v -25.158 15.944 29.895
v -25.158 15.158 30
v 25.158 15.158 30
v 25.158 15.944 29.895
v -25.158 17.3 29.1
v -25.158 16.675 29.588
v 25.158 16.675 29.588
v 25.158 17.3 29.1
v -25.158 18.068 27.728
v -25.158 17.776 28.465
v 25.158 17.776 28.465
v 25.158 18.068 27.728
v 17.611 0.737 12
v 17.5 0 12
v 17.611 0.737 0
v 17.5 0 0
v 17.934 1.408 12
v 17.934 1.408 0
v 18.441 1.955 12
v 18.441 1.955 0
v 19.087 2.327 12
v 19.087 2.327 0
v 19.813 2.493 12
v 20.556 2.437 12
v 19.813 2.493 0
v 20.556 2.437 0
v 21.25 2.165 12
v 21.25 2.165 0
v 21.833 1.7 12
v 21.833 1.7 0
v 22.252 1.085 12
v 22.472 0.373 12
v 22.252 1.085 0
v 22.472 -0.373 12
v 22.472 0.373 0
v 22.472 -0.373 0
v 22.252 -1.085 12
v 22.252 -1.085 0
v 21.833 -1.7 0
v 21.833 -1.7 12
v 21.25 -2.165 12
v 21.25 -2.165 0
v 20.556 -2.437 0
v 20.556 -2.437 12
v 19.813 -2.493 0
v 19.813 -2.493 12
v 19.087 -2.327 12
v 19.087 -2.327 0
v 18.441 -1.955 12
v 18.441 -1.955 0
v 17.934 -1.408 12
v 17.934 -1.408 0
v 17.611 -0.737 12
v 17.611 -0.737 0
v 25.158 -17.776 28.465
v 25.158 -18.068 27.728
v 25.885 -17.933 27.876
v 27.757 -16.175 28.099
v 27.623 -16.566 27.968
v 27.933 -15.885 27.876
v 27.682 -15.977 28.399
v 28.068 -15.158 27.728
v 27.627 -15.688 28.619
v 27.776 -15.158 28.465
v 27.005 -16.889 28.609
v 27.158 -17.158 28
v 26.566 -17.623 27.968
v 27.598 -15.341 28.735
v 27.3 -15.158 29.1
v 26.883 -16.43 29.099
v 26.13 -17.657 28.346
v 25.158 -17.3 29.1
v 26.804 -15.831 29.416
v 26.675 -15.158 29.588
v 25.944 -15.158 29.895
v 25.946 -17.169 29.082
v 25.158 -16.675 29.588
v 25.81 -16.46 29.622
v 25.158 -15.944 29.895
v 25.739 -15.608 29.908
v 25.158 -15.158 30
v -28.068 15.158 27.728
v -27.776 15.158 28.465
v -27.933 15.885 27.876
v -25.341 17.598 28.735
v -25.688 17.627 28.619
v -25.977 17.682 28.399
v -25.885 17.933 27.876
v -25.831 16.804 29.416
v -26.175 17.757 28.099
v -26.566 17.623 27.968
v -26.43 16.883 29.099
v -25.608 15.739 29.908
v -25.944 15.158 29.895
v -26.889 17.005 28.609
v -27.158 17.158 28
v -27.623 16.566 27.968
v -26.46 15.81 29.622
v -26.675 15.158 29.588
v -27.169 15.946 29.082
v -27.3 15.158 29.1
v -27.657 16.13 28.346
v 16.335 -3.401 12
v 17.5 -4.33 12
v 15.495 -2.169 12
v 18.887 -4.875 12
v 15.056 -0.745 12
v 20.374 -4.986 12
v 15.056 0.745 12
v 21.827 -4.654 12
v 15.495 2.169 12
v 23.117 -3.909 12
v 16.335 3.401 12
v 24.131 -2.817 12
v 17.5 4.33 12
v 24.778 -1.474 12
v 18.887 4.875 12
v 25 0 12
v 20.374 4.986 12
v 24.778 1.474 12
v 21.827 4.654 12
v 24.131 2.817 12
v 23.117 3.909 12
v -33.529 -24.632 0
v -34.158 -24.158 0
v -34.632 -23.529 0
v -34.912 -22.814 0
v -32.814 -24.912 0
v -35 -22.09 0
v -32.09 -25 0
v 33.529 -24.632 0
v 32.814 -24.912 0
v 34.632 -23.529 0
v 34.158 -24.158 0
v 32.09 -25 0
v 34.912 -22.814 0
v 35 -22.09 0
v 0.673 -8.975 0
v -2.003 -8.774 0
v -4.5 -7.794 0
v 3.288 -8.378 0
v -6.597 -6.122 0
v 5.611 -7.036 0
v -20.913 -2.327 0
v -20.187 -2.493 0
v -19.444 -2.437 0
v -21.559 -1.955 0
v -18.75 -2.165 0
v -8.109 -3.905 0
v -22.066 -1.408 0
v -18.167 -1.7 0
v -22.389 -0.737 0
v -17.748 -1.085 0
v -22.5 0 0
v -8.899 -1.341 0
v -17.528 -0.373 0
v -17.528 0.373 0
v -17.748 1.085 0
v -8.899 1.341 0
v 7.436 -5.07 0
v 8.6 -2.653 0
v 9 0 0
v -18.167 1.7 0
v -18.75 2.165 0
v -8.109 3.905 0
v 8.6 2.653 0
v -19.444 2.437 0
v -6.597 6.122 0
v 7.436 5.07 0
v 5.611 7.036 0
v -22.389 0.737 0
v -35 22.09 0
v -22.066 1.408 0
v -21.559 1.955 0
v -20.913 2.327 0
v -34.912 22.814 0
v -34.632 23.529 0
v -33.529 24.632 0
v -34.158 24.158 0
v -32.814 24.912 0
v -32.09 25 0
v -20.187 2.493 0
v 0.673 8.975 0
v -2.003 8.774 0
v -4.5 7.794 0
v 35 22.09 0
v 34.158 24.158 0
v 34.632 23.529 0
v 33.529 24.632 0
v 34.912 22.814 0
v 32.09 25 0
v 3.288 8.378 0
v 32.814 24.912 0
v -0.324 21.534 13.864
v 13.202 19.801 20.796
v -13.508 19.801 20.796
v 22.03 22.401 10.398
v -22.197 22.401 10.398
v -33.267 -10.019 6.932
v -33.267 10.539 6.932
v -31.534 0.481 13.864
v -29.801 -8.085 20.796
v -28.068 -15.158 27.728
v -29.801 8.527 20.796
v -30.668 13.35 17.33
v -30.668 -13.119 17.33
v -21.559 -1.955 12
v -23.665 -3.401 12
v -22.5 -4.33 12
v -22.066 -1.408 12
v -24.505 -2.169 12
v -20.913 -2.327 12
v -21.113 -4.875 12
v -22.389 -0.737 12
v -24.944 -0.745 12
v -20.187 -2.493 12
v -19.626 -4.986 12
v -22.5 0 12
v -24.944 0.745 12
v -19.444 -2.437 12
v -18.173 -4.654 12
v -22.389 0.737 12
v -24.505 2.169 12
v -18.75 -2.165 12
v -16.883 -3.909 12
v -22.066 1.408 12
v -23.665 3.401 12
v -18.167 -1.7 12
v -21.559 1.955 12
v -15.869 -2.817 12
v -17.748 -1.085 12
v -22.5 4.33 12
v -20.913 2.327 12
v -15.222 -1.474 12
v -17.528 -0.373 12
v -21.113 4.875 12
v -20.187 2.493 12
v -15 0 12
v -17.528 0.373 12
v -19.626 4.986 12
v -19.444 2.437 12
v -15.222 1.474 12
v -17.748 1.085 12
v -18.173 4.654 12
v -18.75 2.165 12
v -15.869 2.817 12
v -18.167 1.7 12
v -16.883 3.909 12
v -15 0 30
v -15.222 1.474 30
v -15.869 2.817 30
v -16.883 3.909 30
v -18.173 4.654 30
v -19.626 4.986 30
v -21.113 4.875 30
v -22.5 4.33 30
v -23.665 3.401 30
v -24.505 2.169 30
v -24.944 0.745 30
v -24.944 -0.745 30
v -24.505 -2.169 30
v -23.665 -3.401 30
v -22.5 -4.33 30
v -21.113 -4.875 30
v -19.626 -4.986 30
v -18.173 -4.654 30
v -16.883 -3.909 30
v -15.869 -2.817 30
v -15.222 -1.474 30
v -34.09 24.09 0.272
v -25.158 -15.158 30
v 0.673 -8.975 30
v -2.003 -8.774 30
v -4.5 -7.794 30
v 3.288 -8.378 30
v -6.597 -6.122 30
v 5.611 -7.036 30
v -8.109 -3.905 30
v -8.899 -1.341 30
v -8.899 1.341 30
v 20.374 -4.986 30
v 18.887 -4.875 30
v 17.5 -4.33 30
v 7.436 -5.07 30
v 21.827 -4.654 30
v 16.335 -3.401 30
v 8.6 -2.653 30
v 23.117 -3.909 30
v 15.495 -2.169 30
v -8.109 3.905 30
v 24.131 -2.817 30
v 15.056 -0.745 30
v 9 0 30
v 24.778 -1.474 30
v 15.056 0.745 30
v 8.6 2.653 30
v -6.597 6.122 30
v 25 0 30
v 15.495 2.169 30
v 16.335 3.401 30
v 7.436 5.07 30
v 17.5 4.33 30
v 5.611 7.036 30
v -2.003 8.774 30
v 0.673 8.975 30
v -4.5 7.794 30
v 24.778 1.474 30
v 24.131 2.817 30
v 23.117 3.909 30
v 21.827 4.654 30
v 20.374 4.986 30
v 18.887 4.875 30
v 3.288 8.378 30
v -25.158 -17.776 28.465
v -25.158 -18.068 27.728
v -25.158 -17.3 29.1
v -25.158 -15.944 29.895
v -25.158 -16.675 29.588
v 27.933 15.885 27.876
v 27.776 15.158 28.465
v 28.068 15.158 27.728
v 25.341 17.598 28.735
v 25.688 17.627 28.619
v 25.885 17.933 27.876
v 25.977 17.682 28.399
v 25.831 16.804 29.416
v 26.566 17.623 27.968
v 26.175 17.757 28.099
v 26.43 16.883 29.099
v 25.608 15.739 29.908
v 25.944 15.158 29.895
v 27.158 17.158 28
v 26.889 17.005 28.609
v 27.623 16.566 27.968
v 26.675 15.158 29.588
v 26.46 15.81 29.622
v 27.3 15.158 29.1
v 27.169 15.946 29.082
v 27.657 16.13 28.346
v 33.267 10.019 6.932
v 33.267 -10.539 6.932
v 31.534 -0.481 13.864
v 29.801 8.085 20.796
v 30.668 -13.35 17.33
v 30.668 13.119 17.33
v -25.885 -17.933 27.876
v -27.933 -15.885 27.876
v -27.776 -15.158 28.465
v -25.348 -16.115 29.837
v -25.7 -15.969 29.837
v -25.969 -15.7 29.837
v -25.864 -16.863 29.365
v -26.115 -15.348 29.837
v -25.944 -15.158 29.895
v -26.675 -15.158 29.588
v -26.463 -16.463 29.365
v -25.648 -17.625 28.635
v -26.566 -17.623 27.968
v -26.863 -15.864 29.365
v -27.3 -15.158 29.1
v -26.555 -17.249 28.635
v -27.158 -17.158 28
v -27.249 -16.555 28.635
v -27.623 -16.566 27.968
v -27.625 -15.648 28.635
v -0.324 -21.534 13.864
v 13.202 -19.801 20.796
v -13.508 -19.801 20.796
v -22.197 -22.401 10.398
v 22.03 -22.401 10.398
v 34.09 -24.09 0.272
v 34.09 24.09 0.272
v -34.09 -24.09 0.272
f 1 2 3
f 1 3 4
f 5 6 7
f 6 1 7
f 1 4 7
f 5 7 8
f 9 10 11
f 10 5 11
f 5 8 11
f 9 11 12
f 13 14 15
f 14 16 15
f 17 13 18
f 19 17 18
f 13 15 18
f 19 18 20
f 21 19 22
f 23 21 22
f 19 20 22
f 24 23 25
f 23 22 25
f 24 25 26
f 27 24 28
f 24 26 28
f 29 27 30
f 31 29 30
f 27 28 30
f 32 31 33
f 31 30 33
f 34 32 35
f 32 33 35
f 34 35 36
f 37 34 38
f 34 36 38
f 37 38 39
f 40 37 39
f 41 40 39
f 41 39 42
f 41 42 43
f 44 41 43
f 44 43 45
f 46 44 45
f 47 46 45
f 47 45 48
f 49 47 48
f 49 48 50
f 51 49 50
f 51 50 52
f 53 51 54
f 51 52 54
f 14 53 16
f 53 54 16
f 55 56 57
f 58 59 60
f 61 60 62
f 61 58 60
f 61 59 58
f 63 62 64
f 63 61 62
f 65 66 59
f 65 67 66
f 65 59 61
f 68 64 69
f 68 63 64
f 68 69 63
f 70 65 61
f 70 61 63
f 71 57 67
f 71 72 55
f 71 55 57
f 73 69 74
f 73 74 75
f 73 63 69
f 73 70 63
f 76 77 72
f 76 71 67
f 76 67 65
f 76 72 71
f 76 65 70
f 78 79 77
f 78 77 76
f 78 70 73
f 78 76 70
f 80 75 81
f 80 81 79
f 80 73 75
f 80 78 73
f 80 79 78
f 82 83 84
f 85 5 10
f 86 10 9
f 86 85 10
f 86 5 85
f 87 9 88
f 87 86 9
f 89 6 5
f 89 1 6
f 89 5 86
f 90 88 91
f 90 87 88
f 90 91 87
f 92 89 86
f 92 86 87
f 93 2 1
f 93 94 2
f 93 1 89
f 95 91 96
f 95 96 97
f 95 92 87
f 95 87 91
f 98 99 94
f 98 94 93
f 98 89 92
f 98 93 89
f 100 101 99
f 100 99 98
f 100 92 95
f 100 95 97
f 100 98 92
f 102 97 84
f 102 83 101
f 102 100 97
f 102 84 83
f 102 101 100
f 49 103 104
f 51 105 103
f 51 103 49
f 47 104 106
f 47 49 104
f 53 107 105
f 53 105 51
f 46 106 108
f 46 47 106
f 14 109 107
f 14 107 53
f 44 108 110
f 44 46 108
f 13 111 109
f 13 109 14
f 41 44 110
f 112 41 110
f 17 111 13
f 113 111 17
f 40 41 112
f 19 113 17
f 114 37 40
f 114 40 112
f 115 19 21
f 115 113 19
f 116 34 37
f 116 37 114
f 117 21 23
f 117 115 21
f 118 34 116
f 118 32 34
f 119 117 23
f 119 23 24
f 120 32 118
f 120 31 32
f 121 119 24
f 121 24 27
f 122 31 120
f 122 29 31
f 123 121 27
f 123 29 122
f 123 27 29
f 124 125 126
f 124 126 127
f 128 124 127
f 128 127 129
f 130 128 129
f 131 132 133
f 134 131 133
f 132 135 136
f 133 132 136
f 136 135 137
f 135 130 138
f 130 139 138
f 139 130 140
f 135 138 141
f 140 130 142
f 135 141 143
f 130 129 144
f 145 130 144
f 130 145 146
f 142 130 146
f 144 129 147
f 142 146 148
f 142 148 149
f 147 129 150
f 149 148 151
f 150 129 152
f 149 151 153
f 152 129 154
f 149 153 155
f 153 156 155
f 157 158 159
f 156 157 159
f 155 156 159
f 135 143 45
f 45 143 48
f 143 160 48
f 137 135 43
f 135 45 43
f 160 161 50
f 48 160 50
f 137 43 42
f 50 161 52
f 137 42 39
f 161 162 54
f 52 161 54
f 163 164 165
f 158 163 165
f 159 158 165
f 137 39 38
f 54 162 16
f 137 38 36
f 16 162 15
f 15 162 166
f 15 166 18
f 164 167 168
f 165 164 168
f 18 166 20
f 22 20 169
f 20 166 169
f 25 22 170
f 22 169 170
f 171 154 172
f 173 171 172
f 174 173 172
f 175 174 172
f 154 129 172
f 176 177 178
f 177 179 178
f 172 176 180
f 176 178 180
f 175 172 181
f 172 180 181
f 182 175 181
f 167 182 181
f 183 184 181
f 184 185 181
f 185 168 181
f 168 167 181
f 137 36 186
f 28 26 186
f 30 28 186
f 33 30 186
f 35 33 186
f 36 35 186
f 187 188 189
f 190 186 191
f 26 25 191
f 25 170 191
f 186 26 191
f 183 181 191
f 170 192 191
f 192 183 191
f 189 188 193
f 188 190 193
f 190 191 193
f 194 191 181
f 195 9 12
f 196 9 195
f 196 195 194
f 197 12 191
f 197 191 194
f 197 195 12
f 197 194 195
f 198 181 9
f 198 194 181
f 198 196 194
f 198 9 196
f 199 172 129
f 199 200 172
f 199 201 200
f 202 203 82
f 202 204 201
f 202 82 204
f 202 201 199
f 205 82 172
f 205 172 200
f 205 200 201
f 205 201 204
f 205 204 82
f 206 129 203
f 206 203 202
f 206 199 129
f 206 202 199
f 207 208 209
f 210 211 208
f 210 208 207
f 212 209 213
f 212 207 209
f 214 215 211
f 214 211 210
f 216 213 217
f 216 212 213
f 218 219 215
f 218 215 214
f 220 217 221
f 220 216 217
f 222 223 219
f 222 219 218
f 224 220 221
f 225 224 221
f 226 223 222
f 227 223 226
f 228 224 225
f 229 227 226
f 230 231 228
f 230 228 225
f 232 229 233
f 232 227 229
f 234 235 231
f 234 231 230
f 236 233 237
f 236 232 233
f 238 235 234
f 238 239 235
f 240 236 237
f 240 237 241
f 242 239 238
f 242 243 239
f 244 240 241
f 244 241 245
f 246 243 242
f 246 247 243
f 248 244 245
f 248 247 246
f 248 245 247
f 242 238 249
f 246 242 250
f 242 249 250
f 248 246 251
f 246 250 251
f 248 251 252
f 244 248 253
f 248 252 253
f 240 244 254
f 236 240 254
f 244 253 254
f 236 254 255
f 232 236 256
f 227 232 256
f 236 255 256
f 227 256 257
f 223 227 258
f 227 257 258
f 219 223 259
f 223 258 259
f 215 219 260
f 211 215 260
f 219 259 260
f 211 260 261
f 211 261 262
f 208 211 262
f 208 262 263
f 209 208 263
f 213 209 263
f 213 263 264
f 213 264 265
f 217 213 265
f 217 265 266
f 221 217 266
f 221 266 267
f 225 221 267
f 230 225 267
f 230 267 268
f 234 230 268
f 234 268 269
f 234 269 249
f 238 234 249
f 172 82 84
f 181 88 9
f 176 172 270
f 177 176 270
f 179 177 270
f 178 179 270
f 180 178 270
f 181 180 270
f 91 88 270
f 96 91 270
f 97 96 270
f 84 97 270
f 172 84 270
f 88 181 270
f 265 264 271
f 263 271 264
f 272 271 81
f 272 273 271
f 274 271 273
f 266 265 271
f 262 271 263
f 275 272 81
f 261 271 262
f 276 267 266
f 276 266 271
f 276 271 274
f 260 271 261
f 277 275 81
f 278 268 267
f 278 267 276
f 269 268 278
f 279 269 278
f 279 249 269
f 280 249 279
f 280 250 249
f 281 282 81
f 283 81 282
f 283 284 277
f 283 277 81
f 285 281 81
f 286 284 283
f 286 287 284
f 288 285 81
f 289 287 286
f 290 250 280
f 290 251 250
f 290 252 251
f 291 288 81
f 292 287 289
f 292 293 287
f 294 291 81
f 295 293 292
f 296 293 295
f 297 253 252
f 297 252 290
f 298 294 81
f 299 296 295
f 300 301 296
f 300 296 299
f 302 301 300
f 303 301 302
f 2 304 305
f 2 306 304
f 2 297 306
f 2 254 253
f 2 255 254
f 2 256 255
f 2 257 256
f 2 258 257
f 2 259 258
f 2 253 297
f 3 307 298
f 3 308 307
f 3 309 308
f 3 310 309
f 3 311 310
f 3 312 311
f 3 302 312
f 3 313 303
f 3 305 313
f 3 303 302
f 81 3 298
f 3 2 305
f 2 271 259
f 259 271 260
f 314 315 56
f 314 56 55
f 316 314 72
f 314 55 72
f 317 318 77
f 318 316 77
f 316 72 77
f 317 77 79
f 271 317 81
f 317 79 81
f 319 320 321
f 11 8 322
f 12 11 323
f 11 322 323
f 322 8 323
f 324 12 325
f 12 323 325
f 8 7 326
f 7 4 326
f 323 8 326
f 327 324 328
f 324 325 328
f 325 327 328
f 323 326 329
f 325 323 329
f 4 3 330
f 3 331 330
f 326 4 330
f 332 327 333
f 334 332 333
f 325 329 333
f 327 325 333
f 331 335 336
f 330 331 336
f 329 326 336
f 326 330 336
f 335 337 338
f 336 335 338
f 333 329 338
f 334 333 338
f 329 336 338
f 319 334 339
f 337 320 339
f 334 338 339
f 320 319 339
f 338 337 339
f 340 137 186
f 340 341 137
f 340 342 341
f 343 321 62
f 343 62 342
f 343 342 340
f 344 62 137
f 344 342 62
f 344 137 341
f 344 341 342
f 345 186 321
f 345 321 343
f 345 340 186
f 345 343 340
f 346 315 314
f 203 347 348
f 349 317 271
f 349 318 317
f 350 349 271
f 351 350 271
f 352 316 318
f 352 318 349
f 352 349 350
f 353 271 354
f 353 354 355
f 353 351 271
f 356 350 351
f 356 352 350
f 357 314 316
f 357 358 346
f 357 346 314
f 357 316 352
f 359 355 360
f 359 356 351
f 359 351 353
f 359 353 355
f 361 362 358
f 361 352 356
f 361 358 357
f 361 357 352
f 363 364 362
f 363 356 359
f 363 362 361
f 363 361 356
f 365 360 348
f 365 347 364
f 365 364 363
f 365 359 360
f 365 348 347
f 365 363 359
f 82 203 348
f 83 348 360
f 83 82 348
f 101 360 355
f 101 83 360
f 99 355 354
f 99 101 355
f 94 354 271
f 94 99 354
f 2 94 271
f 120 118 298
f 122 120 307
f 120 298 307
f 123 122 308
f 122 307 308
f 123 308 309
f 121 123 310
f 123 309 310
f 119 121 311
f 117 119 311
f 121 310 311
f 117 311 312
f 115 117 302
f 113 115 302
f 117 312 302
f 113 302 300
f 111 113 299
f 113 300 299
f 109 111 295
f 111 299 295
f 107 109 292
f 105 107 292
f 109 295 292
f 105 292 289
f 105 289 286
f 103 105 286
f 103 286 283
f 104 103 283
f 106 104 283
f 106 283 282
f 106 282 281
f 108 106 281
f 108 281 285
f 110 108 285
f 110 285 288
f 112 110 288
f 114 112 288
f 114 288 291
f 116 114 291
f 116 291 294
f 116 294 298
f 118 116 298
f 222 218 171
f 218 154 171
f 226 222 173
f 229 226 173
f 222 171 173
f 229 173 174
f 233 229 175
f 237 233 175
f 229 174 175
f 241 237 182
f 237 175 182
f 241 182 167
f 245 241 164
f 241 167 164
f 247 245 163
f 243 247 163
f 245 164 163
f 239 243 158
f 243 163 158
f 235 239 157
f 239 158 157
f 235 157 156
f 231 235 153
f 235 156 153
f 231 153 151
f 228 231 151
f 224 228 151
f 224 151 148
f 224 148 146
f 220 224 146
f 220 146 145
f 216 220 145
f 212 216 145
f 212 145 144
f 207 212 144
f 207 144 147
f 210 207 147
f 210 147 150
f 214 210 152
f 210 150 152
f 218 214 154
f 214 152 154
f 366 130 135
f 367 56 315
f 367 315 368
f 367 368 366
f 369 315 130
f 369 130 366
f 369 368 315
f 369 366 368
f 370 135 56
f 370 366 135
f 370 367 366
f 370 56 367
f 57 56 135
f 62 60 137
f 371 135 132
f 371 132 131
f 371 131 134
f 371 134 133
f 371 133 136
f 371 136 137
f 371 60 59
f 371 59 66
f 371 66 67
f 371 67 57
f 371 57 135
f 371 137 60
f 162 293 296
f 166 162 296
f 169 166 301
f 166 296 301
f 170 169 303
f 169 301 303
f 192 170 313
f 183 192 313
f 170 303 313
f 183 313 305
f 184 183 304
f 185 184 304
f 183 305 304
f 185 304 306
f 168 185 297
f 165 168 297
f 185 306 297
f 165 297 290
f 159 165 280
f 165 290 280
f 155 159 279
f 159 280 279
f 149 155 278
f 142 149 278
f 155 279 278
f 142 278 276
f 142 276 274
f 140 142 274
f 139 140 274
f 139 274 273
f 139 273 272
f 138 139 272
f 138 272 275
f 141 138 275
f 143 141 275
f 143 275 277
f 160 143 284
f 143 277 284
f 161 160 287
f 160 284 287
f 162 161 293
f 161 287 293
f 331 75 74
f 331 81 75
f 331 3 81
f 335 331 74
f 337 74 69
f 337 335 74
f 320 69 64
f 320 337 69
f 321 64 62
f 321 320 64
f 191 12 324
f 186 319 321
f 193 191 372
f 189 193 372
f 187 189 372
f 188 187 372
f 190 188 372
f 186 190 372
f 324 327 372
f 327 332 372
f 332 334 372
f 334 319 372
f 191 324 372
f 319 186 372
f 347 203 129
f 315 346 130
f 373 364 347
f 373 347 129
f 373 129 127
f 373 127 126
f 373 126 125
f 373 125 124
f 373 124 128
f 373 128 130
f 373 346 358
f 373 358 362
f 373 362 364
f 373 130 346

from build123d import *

# Parameters (mm, degrees)
SKETCH_W         = 70
SKETCH_H         = 50
SKETCH001_W      = 55
SKETCH001_H      = 35
SKETCH002_R      = 9
POCKET_DEPTH     = 30
HOLE_D           = 5
HOLE_CBORE_D     = 10
HOLE_CBORE_DEPTH = 18
FILLET_R         = 3


with BuildPart() as part:
    # Sketch → AdditiveLoft section 0
    with BuildSketch(Plane.XY):
        Rectangle(SKETCH_W, SKETCH_H)
    # Sketch001 (on DatumPlane) → AdditiveLoft section 1
    with BuildSketch(Plane.XY.offset(30)):
        Rectangle(SKETCH001_W, SKETCH001_H)
    loft()

    # Sketch002 (on DatumPlane) → Pocket (cut)
    with BuildSketch(Plane.XY.offset(30)):
        Circle(SKETCH002_R)
    extrude(amount=-POCKET_DEPTH, mode=Mode.SUBTRACT)

    # Hole (through all)
    with Locations(Plane.XY.offset(30)):
        with Locations((-20, 0), (20, 0)):
            CounterBoreHole(HOLE_D / 2, HOLE_CBORE_D / 2, HOLE_CBORE_DEPTH)

    # Fillet
    fillet_edges = [part.edges().sort_by_distance(p)[0] for p in [
        (-31.25, -21.25, 15),
        (0, -17.5, 30),
        (-27.5, 0, 30),
        (31.25, -21.25, 15),
        (27.5, 0, 30),
        (0, 17.5, 30),
        (-31.25, 21.25, 15),
        (31.25, 21.25, 15),
    ]]
    fillet(fillet_edges, radius=FILLET_R)


solid = part.part
